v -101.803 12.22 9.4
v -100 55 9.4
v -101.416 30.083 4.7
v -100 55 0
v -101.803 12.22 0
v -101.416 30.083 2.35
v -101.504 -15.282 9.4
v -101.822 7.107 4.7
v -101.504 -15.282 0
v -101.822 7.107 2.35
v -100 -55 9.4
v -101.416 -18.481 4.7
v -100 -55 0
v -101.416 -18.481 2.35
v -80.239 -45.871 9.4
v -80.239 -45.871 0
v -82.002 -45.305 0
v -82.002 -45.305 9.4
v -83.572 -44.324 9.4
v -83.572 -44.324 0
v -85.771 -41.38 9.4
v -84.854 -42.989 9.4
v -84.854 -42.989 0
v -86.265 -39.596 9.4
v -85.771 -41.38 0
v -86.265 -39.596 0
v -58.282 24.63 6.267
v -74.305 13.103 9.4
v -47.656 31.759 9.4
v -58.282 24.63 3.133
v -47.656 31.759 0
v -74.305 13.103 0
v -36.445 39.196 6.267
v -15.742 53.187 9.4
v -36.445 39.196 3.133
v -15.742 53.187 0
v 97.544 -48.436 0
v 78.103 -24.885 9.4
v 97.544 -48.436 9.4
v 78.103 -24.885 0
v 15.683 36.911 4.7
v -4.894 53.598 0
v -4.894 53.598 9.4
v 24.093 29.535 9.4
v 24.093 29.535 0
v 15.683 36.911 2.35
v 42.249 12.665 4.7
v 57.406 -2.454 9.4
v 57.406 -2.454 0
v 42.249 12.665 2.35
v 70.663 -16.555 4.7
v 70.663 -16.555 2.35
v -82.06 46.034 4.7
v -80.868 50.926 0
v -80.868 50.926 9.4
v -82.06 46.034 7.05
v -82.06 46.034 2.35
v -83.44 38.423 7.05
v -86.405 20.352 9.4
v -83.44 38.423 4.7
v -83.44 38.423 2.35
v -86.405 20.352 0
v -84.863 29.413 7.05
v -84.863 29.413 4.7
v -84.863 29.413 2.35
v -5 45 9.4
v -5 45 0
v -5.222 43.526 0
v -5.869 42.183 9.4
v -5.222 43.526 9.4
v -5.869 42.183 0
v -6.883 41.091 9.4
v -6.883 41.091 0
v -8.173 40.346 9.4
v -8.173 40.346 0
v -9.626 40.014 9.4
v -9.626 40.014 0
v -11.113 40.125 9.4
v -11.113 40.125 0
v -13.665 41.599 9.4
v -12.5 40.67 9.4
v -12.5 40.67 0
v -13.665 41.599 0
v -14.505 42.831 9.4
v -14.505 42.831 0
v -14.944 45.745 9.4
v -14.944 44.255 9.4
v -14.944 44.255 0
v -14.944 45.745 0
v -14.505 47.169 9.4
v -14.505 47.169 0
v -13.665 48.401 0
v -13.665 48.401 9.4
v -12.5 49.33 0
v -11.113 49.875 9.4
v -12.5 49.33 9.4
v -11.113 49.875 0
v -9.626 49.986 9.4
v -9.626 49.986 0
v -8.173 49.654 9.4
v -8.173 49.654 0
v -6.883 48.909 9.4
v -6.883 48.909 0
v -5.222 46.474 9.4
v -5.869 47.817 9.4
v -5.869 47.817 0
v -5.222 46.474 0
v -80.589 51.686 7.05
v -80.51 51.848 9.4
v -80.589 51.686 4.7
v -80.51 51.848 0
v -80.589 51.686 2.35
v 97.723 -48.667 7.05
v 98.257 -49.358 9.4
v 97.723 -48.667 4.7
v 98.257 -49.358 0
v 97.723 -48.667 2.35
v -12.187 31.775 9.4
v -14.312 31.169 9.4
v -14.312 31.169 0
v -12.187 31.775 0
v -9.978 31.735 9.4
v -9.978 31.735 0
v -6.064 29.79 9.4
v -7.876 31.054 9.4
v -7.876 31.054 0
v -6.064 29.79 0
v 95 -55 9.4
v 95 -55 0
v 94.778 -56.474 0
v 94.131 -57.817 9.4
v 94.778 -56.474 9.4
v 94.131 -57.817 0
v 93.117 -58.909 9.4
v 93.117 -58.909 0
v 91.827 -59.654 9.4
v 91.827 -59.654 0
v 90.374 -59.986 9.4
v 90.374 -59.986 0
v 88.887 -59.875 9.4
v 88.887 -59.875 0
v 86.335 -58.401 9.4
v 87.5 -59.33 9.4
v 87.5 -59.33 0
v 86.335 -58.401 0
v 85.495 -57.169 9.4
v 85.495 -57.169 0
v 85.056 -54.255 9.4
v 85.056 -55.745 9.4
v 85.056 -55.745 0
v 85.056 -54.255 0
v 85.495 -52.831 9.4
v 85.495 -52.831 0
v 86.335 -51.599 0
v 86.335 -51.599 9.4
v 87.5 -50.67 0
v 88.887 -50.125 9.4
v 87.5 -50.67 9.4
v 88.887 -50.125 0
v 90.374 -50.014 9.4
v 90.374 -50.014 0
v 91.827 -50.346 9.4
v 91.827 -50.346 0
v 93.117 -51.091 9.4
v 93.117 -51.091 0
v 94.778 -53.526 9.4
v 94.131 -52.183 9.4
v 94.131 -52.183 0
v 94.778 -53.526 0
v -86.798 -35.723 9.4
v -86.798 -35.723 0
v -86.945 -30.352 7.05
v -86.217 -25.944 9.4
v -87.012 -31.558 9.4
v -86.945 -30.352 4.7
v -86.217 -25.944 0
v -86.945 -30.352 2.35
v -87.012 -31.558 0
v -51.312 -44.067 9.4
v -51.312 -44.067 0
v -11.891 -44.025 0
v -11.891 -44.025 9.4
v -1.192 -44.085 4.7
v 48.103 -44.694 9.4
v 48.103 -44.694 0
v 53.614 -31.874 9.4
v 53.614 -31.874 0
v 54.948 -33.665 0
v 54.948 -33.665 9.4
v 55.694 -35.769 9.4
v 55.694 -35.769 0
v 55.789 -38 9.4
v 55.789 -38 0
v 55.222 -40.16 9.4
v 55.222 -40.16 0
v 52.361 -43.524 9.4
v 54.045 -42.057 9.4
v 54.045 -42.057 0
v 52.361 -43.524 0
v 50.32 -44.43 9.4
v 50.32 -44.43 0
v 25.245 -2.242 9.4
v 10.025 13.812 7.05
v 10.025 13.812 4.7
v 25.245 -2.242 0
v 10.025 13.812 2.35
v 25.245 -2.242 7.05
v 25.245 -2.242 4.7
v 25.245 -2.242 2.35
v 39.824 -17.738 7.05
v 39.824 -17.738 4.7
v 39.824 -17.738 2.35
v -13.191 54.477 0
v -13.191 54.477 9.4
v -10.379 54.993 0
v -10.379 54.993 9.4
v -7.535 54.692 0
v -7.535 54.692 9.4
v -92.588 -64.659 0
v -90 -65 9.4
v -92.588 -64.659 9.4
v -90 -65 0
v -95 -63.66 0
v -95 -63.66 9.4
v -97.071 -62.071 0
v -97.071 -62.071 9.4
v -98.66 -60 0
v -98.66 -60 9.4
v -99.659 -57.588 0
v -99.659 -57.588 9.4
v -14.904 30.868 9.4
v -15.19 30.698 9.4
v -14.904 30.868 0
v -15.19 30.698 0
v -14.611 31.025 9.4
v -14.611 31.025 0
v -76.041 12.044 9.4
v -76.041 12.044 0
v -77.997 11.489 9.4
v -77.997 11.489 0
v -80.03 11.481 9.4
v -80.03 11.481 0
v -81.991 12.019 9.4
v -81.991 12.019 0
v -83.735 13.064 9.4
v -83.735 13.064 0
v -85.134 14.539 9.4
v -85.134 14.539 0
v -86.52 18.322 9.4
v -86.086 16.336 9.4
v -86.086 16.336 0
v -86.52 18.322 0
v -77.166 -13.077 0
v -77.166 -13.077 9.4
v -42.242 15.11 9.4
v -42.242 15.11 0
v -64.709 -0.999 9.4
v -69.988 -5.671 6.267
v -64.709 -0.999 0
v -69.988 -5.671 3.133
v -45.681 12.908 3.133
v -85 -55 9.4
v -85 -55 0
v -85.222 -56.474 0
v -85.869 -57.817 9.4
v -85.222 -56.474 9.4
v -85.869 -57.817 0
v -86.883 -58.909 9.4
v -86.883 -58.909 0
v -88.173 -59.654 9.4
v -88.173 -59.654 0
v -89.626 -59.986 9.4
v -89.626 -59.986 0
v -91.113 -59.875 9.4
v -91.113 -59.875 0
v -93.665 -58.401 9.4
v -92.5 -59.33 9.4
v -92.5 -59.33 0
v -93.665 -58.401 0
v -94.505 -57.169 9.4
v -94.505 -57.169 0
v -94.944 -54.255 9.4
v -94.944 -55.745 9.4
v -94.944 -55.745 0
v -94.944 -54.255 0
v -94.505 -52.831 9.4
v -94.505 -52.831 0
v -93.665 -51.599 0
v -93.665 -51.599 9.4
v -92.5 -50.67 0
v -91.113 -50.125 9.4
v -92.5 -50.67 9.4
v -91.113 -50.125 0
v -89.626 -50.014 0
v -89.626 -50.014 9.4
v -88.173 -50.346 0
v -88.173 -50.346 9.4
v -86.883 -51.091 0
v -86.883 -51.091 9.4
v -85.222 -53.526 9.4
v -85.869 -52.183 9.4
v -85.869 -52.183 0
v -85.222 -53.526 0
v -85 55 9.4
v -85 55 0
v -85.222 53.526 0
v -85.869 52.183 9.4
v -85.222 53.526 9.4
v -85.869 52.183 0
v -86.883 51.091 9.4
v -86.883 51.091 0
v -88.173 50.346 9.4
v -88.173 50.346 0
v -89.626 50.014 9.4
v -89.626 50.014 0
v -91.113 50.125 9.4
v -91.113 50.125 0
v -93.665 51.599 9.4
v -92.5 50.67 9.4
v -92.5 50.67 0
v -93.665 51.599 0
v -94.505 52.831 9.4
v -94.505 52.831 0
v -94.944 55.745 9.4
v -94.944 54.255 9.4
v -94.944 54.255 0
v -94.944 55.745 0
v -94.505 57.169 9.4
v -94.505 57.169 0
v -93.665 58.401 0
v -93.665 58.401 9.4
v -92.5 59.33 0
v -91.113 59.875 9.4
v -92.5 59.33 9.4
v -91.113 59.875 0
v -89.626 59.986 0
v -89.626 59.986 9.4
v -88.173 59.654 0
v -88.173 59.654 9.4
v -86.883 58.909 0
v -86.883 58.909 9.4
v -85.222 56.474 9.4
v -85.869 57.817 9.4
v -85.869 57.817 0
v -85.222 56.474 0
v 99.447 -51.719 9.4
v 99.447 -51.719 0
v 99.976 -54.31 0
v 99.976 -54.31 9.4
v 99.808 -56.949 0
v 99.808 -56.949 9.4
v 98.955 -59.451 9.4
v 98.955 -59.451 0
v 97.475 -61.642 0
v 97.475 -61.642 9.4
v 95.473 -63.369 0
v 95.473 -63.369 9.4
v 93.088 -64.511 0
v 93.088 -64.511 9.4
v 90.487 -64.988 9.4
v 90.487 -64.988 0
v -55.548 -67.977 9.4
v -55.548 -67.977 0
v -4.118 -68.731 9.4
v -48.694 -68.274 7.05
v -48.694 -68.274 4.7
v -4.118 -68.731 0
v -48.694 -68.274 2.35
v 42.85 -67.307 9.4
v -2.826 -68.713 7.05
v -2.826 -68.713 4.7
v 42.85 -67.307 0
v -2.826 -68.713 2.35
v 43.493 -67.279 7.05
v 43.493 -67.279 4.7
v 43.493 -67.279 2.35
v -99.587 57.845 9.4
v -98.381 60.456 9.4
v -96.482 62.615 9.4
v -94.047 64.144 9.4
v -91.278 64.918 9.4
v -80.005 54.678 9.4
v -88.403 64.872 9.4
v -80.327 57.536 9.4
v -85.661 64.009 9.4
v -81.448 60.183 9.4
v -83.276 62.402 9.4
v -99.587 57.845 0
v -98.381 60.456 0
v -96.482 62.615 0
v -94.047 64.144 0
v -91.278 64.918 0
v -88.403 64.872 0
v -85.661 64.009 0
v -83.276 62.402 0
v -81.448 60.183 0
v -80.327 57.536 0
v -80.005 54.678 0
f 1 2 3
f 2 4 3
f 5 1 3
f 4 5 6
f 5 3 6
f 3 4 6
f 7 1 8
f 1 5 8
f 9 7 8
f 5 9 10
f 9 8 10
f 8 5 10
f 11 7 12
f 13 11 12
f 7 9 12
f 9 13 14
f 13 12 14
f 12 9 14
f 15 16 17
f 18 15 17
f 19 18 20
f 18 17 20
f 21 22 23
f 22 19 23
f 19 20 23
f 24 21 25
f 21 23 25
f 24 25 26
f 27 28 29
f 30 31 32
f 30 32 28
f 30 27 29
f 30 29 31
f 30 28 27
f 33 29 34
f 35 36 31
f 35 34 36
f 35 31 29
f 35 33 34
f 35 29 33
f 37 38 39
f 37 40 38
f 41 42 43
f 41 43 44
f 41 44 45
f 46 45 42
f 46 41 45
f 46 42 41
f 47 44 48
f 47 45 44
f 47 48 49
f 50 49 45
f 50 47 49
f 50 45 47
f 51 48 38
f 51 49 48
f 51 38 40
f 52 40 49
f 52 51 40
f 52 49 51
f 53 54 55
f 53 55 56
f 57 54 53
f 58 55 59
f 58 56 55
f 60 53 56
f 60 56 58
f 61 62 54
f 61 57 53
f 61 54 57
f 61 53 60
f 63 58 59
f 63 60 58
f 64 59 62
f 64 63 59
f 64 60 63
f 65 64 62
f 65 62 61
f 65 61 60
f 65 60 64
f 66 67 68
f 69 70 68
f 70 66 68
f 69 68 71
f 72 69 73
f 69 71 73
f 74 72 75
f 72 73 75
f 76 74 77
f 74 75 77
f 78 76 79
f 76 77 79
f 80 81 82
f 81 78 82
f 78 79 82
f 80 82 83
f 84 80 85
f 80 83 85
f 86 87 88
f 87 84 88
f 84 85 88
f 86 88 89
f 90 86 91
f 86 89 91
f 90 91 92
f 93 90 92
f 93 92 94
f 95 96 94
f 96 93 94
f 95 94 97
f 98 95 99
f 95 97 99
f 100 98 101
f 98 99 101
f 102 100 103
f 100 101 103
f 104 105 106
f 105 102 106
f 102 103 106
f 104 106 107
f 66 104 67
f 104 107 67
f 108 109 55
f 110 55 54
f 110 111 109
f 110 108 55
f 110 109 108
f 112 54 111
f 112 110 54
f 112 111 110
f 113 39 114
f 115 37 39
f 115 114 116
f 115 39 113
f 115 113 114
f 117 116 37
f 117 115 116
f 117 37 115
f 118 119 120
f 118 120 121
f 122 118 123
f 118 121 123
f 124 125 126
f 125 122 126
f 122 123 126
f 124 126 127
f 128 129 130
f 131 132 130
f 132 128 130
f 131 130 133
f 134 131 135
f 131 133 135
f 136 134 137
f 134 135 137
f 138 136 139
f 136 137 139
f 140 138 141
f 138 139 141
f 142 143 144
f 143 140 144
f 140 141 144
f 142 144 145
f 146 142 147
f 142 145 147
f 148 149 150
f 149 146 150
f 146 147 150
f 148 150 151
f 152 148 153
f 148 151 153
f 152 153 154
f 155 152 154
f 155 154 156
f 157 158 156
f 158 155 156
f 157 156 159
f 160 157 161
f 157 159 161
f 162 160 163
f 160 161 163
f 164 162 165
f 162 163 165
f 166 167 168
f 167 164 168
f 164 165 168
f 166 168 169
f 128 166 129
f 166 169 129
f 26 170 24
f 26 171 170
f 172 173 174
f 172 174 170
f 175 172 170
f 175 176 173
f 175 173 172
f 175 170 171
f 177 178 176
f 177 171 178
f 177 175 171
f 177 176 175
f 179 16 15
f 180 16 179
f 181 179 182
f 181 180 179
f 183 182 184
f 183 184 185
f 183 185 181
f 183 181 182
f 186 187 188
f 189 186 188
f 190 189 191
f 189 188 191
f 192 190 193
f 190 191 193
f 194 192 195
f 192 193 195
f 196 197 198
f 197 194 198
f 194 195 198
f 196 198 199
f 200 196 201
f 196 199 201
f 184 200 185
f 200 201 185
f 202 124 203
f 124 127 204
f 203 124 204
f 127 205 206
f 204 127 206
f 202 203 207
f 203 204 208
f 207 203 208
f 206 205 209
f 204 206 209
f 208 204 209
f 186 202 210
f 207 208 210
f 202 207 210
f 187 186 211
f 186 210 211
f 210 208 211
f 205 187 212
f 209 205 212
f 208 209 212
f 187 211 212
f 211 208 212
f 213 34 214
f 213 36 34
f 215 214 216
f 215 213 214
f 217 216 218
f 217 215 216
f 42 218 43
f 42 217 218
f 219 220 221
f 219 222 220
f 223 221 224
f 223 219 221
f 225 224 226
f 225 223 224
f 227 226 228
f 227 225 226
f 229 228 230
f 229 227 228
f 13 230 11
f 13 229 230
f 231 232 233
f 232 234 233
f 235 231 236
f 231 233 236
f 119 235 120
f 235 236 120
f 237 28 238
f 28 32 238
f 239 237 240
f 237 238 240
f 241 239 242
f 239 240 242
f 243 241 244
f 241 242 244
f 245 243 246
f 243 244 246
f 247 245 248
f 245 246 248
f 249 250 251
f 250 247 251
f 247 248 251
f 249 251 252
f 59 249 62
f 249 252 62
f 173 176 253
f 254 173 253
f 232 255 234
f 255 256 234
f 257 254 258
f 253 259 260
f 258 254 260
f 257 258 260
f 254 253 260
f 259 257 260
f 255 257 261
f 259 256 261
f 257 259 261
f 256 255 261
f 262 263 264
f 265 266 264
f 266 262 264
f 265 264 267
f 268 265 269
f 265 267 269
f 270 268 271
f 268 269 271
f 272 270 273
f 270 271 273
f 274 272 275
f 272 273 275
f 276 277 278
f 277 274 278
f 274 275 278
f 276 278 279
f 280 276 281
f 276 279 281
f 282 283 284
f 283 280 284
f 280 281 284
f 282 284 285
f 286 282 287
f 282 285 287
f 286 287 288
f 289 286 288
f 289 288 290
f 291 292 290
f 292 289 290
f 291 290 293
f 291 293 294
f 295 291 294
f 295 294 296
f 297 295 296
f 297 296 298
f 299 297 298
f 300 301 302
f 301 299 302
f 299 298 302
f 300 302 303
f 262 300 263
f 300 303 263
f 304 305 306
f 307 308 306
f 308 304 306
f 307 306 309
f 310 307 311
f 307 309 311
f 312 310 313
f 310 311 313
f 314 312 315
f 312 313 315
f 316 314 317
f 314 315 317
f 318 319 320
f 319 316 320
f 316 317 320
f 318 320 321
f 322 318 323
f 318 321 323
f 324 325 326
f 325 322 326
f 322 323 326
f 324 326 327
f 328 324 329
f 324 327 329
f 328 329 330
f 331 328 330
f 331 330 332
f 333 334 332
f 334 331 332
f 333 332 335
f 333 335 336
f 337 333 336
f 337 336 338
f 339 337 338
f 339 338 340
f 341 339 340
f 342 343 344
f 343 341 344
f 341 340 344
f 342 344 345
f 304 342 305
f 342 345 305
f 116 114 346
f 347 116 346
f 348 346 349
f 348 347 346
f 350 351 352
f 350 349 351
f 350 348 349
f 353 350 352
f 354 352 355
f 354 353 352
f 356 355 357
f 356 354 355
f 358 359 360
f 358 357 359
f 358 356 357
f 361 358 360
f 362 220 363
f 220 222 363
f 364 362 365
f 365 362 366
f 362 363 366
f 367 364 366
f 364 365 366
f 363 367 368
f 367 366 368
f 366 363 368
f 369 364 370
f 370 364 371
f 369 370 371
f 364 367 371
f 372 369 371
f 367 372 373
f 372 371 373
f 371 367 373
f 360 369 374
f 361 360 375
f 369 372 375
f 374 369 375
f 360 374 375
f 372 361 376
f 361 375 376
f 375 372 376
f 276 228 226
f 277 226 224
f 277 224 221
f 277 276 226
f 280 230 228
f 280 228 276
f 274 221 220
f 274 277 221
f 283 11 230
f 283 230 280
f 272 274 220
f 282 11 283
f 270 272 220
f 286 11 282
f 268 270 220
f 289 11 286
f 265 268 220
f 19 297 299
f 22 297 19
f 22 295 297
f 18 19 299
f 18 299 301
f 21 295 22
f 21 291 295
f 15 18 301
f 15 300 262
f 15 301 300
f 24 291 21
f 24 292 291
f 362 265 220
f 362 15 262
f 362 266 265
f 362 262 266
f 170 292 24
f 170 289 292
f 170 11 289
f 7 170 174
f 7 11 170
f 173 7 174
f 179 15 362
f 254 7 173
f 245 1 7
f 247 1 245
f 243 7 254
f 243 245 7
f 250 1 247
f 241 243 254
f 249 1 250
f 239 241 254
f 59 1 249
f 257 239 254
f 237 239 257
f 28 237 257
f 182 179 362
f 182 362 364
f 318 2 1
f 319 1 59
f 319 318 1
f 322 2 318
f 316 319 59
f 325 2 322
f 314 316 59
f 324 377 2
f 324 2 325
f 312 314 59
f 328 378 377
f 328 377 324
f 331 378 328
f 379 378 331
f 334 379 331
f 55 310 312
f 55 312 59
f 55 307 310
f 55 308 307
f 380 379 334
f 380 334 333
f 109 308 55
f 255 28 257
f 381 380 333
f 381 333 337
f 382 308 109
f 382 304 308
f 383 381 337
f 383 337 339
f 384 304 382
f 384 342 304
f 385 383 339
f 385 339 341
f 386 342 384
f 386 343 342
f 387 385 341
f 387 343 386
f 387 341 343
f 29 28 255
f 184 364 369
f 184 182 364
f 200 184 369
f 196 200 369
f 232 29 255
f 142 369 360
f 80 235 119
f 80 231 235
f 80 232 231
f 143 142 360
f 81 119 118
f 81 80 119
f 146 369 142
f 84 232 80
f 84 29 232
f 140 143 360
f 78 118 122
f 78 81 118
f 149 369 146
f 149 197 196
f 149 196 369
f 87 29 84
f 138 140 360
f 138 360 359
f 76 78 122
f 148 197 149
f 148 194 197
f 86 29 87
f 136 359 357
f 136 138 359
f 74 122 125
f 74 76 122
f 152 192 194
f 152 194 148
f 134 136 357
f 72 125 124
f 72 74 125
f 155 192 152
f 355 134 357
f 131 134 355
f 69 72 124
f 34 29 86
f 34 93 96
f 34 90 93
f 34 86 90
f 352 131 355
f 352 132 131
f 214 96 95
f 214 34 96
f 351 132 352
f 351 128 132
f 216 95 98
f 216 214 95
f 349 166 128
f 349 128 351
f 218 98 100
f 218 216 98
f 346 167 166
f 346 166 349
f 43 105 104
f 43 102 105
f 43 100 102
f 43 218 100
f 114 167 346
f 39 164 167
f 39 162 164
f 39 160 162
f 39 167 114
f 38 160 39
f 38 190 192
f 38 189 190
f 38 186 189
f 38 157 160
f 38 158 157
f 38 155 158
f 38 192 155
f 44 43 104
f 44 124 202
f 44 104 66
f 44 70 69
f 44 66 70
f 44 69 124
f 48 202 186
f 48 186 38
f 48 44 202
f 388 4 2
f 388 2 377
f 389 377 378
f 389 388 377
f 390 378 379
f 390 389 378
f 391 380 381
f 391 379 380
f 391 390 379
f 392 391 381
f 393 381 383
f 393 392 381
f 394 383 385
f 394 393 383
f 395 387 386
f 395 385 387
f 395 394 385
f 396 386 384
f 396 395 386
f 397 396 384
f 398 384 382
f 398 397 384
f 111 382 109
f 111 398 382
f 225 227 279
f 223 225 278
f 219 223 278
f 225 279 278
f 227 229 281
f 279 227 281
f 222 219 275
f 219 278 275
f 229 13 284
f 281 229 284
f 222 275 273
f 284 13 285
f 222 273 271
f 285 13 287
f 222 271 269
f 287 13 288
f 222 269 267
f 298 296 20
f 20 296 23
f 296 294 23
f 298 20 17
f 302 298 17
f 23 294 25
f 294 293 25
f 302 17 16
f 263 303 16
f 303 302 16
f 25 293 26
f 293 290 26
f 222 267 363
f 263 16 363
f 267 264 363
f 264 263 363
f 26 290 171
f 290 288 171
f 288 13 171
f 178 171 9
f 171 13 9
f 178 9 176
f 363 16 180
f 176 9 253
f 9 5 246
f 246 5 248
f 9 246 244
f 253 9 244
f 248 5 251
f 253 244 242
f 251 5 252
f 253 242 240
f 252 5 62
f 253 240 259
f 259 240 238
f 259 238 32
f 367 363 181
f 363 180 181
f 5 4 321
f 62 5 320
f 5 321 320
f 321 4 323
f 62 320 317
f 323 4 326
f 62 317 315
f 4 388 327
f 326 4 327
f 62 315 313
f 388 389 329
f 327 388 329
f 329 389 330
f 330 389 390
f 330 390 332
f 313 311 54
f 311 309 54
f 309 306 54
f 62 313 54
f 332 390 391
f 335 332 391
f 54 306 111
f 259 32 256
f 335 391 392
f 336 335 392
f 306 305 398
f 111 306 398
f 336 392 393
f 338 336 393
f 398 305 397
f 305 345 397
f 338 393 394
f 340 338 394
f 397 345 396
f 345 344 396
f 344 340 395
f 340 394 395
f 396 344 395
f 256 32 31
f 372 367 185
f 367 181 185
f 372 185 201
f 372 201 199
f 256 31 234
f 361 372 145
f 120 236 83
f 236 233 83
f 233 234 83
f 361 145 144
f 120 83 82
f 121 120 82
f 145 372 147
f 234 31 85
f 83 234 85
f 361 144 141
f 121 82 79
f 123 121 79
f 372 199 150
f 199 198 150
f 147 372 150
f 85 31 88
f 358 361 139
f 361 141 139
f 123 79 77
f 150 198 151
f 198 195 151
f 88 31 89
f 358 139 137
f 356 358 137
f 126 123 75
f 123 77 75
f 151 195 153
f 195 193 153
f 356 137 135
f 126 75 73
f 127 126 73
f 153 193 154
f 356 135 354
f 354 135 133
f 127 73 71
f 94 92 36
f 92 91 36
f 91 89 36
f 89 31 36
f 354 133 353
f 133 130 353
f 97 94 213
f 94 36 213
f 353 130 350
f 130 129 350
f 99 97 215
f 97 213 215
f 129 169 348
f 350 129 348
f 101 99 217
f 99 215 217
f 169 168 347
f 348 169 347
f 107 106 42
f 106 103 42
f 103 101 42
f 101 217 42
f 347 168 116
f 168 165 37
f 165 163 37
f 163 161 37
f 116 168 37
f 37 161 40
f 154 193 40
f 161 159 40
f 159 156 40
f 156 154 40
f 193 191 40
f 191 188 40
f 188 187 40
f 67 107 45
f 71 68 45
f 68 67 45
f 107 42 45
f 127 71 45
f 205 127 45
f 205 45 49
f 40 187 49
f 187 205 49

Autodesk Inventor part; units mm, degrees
ref_plane "YZ Plane" through (0, 0, 0) normal (1, 0, 0) x (0, 1, 0)
ref_plane "XZ Plane" through (0, 0, 0) normal (0, 1, 0) x (-1, 0, 0)
ref_plane "XY Plane" through (0, 0, 0) normal (0, 0, 1) x (1, 0, 0)
sketch "Sketch1" plane through (0, 0, 0) normal (0, 0, 1) x (1, 0, 0)
  line L0 (-110, 70) -> (110, 70) construction
  line L1 (110, 70) -> (110, -70) construction
  line L2 (110, -70) -> (-110, -70) construction
  line L3 (-110, -70) -> (-110, 70) construction
  circle A0 centre (-90, 55) radius 5
  circle A1 centre (-90, -55) radius 5
  circle A2 centre (90, -55) radius 5
  circle A3 centre (-10, 45) radius 5
  line L4 (-67, 0) -> (-42, 0) construction
  line L5 (-42, 0) -> (-42, -30) construction
  line L6 (-42, -30) -> (-67, -30) construction
  line L7 (-67, -30) -> (-67, 0) construction
  circle A4 centre (-54.5, -11) radius 10 construction
  circle A5 centre (-63.5044, -24.4163) radius 3 construction
  circle A6 centre (-57.3559, -26.4695) radius 3 construction
  circle A7 centre (-51.263, -24.6531) radius 3 construction
  circle A8 centre (-45.3418, -26.5938) radius 3 construction
  arc A9 (-80.8676, 50.9258) -> (-100, 55) centre (-90, 55) ccw
  arc A10 (-4.8937, 53.598) -> (-15.7422, 53.187) centre (-10, 45) ccw
  arc A11 (90.4874, -64.9881) -> (88.2039, -45.1626) centre (90, -55) ccw
  line L8 (-100, 55) -> (-102.0827, 28.5336) construction
  line L9 (-102.0827, 28.5336) -> (-102.0827, 6.1317) construction
  line L10 (-102.0827, 6.1317) -> (-102.0827, -9.3012) construction
  line L11 (-102.0827, -9.3012) -> (-100, -55) construction
  spline S0 degree 4 poles (-100, 55) (-102.0827, 28.5336) (-102.0827, 6.1317) (-102.0827, -9.3012) (-100, -55) knots 1 1 1 1 1 2 2 2 2 2
  line L12 (-80.5098, 51.8478) -> (-81.3111, 50.3761) construction
  line L13 (-33.5621, 40.6884) -> (-15.7422, 53.187) construction
  spline S1 degree 3 poles (-74.3051, 13.1026) (-63.5044, 21.906) (-33.5621, 40.6884) (-15.7422, 53.187) knots 1.047287 1.047287 1.047287 1.047287 2 2 2 2
  line L14 (-90, -65) -> (-53.427, -70) construction
  line L15 (-53.427, -70) -> (0, -70) construction
  line L16 (0, -70) -> (41.9992, -67.3543) construction
  line L17 (41.9992, -67.3543) -> (90.4874, -64.9881) construction
  spline S2 degree 4 poles (-90, -65) (-53.427, -70) (0, -70) (41.9992, -67.3543) (90.4874, -64.9881) knots 1 1 1 1 1 2 2 2 2 2
  arc A12 (-100, -55) -> (-90, -65) centre (-90, -55) ccw
  spline S3 degree 3 poles (-86.2173, -25.9445) (-74.5546, -4.3329) (-47.6722, 13.3107) (-14.3115, 31.1686) knots 1.116691 1.116691 1.116691 1.116691 1.90623 1.90623 1.90623 1.90623
  line L18 (-86.2173, -25.9445) -> (-74.5546, -4.3329) construction
  spline S4 degree 4 poles (-80.5098, 51.8478) (-81.3111, 50.3761) (-83.3432, 41.5365) (-84.547, 29.8741) (-86.4048, 20.3523) knots 1 1 1 1 1 1.500456 1.500456 1.500456 1.500456 1.500456
  spline S5 degree 4 poles (-86.2173, -25.9445) (-87.4499, -31.1305) (-87.0929, -33.8364) (-86.699, -36.6544) (-86.2648, -39.5964) knots 1.850189 1.850189 1.850189 1.850189 1.850189 1.936877 1.936877 1.936877 1.936877 1.936877
  line L19 (-86.2173, -25.9445) -> (-87.4499, -31.1305) construction
  arc A13 (-86.2648, -39.5964) -> (-80.2389, -45.8706) centre (-78.8452, -38.5013) ccw
  line L20 (-87.4499, -31.1305) -> (-87.0929, -33.8364) construction
  line L21 (-87.0929, -33.8364) -> (-86.699, -36.6544) construction
  line L22 (-86.699, -36.6544) -> (-86.2648, -39.5964) construction
  arc A14 (-86.4048, 20.3523) -> (-74.3051, 13.1026) centre (-79.0436, 18.9161) ccw
  line L23 (-81.3111, 50.3761) -> (-83.3432, 41.5365) construction
  line L24 (-83.3432, 41.5365) -> (-84.547, 29.8741) construction
  line L25 (-84.547, 29.8741) -> (-86.4048, 20.3523) construction
  line L26 (-74.3051, 13.1026) -> (-63.5044, 21.906) construction
  line L27 (-63.5044, 21.906) -> (-33.5621, 40.6884) construction
  spline S6 degree 4 poles (-6.0641, 29.79) (10.6281, 14.0219) (25.4029, -2.497) (40.3618, -18.7245) (53.6143, -31.8741) knots 1.041568 1.041568 1.041568 1.041568 1.041568 1.754128 1.754128 1.754128 1.754128 1.754128
  line L28 (-4.8937, 53.598) -> (11.2306, 41.5365) construction
  line L29 (11.2306, 41.5365) -> (41.9992, 15.4144) construction
  line L30 (41.9992, 15.4144) -> (73.02, -16.6008) construction
  line L31 (73.02, -16.6008) -> (98.2566, -49.3583) construction
  spline S7 degree 4 poles (-4.8937, 53.598) (11.2306, 41.5365) (41.9992, 15.4144) (73.02, -16.6008) (98.2566, -49.3583) knots 1 1 1 1 1 2 2 2 2 2
  line L32 (-80.2389, -45.8706) -> (-53.343, -43.1999) construction
  line L33 (-53.343, -43.1999) -> (-23.1335, -44.327) construction
  spline S8 degree 4 poles (-80.2389, -45.8706) (-53.343, -43.1999) (-23.1335, -44.327) (4.8754, -43.9641) (34.4585, -44.2782) (48.1029, -44.6945) knots 1 1 1 1 1 2 2.688212 2.688212 2.688212 2.688212 2.688212
  arc A15 (48.1029, -44.6945) -> (53.6143, -31.8741) centre (48.3317, -37.198) ccw
  line L34 (40.3618, -18.7245) -> (53.6143, -31.8741) construction
  line L35 (-23.1335, -44.327) -> (4.8754, -43.9641) construction
  line L36 (4.8754, -43.9641) -> (34.4585, -44.2782) construction
  line L37 (34.4585, -44.2782) -> (48.1029, -44.6945) construction
  arc A16 (-6.0641, 29.79) -> (-15.1895, 30.6979) centre (-11.2144, 24.338) ccw
  line L38 (-74.5546, -4.3329) -> (-47.6722, 13.3107) construction
  line L39 (-47.6722, 13.3107) -> (-14.3115, 31.1686) construction
  line L40 (-6.0641, 29.79) -> (10.6281, 14.0219) construction
  line L41 (10.6281, 14.0219) -> (25.4029, -2.497) construction
  line L42 (25.4029, -2.497) -> (40.3618, -18.7245) construction
  point P0 (0, 0)
  dimension "d1" = 70
  dimension "d2" = 70
  dimension "d3" = 110
  dimension "d4" = 110
  dimension "d5" = 10
  dimension "d6" = 10
  dimension "d7" = 10
  dimension "d8" = 10
  dimension "d9" = 55
  dimension "d10" = 55
  dimension "d11" = 55
  dimension "d12" = 180
  dimension "d13" = 90
  dimension "d14" = 90
  dimension "d15" = 10
  dimension "d16" = 45
  dimension "d17" = 42
  dimension "d18" = 30
  dimension "d19" = 0
  dimension "d20" = 25
  dimension "d21" = 20
  dimension "d22" = 6
  dimension "d23" = 6
  dimension "d24" = 6
  dimension "d25" = 11
  dimension "d26" = 12.5
  dimension "d27" = 6
  dimension "d28" = 20
  dimension "d29" = 20
  dimension "d30" = 20
  dimension "d37" = 15
  dimension "d38" = 15
  dimension "d41" = 15
  dimension "d42" = 15
extrude "Extrusion3" add sketch "Sketch1" along normal blind 9.4 contours S4 A14 S1 A10 S7 A11 S2 A12 S0 A9
equation "\"d1\" = d2"
equation "\"d4\" = d3"
equation "\"d10\" = d9"
equation "\"d11\" = d9"
equation "\"d14\" = d13"
equation "\"d26\" = 0.5 * d20"
properties part number "Bracket Concept MK2"
